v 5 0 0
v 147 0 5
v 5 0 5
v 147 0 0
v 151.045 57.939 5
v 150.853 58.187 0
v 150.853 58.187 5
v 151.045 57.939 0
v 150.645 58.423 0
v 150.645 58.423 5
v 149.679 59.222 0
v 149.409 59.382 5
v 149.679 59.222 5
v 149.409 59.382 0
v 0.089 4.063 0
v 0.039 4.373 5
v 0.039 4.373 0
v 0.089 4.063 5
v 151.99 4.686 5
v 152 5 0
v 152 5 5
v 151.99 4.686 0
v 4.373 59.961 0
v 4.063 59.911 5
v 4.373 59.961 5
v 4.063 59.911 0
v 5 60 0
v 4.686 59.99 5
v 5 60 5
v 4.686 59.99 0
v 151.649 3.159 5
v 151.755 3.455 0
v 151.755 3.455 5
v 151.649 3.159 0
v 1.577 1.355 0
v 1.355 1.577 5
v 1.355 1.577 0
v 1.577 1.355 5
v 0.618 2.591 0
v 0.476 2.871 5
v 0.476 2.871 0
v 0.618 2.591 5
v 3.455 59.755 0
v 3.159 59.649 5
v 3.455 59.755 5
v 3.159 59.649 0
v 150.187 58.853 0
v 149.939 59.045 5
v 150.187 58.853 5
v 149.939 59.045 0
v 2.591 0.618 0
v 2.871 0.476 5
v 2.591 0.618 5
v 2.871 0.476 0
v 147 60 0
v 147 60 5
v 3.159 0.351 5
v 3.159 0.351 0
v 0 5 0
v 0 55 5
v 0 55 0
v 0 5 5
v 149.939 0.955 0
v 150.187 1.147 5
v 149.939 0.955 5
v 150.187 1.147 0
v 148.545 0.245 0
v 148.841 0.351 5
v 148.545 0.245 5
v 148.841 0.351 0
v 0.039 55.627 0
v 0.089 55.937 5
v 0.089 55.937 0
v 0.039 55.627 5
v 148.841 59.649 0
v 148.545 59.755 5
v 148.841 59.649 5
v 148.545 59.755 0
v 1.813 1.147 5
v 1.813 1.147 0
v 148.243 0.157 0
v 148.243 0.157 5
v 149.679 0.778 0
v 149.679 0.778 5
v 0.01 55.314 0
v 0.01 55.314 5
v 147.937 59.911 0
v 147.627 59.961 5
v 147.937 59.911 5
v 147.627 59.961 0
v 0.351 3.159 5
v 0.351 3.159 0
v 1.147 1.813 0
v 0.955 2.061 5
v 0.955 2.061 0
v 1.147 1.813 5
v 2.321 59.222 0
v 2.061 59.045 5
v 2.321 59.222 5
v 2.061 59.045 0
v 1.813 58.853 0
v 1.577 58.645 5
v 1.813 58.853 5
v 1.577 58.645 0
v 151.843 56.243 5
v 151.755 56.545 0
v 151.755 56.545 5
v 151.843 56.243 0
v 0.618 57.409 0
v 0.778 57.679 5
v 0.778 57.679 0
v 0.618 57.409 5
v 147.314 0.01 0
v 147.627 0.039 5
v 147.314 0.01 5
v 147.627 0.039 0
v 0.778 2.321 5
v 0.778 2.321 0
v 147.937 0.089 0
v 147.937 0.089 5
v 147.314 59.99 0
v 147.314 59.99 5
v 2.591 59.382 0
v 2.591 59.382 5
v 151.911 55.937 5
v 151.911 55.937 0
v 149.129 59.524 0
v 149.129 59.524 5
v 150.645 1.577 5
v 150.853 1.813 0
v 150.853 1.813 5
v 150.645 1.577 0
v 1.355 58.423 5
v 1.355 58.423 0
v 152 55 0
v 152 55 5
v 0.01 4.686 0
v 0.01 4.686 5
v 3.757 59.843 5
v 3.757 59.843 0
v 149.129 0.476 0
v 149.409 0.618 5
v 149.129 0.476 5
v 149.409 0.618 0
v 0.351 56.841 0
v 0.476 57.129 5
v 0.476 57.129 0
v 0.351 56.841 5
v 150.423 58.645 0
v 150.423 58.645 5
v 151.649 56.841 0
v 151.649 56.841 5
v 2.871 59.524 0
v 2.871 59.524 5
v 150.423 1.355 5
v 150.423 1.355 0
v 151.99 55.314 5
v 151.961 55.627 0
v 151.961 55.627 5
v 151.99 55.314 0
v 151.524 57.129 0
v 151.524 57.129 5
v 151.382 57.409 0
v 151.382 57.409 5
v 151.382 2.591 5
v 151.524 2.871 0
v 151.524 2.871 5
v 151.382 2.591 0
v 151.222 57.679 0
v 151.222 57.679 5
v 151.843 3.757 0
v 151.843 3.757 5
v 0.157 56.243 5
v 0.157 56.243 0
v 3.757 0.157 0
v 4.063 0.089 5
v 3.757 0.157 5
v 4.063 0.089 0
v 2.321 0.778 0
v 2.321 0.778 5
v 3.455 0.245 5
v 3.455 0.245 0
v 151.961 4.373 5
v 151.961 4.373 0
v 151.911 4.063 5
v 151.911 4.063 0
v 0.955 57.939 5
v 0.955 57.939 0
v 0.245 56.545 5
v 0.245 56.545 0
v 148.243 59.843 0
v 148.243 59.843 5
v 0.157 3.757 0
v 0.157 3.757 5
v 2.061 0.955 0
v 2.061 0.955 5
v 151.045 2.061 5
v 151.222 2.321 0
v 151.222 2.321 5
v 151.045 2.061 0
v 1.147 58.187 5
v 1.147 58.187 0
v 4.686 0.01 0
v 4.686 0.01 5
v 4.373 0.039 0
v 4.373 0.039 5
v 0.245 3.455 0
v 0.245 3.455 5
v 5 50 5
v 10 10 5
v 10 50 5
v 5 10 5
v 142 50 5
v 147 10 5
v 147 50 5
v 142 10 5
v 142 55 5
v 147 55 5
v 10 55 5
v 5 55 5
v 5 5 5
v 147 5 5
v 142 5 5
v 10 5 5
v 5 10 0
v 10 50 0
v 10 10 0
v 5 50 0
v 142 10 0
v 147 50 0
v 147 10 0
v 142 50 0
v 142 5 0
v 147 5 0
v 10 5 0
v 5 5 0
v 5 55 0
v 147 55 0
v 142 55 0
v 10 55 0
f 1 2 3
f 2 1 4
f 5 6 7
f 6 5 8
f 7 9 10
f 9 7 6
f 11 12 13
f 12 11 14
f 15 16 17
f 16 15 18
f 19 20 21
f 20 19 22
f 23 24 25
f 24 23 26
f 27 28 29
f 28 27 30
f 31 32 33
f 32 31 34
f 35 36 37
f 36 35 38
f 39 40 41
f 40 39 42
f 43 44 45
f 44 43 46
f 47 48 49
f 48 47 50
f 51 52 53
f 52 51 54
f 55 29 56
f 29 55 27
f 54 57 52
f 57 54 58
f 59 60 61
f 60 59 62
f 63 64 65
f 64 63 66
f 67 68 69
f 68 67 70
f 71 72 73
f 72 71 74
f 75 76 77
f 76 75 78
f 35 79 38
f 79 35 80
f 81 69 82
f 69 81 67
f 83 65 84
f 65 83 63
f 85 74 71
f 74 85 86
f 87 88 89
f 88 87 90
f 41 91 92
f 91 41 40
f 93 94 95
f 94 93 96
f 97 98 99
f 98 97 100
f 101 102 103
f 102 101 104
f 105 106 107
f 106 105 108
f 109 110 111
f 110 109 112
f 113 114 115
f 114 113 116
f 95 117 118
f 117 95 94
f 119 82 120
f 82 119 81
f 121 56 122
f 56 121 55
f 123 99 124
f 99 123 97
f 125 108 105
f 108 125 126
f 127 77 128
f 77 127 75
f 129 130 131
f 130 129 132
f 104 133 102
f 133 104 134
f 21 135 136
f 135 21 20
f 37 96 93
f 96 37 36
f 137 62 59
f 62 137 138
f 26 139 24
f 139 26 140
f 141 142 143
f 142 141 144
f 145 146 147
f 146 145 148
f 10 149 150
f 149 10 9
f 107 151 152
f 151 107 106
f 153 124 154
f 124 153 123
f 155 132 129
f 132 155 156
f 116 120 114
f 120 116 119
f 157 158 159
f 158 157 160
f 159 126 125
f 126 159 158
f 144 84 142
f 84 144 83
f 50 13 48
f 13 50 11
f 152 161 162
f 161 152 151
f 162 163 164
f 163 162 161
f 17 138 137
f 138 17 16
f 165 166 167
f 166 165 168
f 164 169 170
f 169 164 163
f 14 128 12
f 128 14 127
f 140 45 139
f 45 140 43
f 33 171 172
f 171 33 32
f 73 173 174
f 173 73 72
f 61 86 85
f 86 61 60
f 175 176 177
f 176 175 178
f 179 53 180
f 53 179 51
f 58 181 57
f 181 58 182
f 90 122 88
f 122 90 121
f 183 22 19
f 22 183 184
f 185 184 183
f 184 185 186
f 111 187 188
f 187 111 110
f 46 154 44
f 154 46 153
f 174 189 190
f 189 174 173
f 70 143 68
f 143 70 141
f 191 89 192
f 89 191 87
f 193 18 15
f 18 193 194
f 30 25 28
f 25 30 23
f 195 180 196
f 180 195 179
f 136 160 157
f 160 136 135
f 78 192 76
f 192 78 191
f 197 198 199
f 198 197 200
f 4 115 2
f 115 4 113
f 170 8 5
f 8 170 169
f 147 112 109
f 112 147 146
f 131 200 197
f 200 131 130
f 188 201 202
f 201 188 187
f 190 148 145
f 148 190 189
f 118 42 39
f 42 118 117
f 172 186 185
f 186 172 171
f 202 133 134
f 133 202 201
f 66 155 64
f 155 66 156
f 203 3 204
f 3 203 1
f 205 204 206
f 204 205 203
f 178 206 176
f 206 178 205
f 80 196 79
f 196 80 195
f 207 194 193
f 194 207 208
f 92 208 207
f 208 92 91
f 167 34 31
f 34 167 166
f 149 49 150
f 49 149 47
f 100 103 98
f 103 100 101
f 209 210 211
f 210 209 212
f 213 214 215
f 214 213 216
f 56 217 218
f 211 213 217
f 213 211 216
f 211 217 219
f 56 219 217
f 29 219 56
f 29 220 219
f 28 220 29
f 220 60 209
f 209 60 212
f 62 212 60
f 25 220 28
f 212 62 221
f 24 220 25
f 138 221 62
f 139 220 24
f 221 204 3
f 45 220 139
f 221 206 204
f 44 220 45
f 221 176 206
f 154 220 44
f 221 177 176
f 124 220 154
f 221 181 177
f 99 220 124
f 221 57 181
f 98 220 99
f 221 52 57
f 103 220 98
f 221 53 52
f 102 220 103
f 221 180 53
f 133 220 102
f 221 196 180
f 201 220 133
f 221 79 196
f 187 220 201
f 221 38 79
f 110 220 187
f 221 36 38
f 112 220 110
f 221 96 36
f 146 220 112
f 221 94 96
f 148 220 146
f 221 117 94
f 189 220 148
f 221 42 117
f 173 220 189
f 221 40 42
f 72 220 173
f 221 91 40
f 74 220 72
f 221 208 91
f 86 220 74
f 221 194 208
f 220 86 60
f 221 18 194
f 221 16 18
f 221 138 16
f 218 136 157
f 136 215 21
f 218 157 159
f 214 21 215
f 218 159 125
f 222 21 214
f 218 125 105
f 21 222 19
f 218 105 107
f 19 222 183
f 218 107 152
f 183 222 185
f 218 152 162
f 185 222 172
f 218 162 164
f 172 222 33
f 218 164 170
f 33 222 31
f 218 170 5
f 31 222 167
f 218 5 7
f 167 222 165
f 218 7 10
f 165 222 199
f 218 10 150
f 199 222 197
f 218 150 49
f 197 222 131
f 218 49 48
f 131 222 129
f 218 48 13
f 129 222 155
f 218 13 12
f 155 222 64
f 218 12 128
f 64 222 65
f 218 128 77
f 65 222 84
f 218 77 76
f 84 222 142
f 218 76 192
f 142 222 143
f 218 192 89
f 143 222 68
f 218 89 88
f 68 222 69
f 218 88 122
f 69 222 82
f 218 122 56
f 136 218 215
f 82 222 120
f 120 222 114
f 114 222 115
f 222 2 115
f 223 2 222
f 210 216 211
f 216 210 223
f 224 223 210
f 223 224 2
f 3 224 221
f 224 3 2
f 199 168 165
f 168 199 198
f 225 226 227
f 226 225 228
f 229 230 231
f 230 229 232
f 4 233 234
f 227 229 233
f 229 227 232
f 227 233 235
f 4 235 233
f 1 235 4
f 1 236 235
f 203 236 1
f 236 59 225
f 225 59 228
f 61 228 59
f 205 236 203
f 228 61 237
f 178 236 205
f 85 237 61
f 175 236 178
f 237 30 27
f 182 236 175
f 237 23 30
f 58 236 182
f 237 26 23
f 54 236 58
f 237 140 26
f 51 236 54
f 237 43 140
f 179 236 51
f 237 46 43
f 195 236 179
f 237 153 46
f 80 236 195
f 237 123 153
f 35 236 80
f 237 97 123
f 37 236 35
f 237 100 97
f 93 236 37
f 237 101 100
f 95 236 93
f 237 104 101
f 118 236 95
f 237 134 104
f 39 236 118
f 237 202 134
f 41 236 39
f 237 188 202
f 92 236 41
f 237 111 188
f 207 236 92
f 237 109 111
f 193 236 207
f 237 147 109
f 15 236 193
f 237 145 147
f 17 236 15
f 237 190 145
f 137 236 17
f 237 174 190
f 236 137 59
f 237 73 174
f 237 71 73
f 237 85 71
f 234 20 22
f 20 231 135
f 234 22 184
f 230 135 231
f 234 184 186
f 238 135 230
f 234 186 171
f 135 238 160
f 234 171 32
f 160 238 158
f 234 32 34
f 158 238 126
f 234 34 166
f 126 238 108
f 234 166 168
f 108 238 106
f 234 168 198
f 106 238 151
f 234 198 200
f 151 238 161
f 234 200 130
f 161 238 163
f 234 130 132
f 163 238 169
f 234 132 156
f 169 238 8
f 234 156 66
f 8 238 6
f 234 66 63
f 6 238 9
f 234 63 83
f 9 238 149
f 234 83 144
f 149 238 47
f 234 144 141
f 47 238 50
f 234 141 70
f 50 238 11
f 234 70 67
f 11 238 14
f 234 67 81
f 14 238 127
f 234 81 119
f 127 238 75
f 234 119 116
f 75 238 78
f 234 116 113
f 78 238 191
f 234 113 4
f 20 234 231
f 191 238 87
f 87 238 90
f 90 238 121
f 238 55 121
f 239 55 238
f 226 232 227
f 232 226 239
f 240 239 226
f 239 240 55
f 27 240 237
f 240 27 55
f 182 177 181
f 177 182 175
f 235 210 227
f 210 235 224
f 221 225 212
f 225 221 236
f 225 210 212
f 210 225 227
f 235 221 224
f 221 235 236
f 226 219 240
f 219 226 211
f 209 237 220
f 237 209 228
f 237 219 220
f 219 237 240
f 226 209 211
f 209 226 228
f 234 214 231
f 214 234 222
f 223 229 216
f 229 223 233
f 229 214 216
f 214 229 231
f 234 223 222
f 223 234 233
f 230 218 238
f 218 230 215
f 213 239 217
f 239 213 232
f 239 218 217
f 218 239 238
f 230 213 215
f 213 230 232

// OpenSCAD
/*
 * Simple Modular Frame v1.0
 *
 * http://www.thingiverse.com/thing:1902773
 *
 * By: Maxstupo
 */


/* [Frame Settings] */
// (Select what part to generate):
framePart = 1; // [0:3]

// (The width of the plate):
width = 152;

// (The length of the plate):
length = 60;

// (The height of the plate, also used for the stilt generation):
height = 5;

// (The stilt size, and the stilt slot size):
slotSize = 5;

// (The spacing between the edges of the plate and the stilt slots):
spacing = 5;

// (The plate fillet):
fillet = 10;



/* [Frame 2 Settings] */
// (The width between the mount holes from center-to-center):
mountWidth = 20;

// (The length between the mount holes from center-to-center):
mountLength = 40;

// (The diameter of the mount holes):
mountHoleSize = 3;

// (The spacing from the edge of the plate):
mountSpacingFromEdge = 10;


/* [Frame 3 Settings] */
// (The height of the stilt):
stiltHeight = 50;


/* [Misc] */
// (The tolerance to apply to both plates or stilts):
tolerance = 0;

// (The tolerance for the test part #0):
toleranceTest = 0;

$fn=100;

if(framePart == 0) {
    toleranceTest(rodSize=5,rodLength=30,thickness=5,tolerance=toleranceTest);  
    
} else if (framePart == 1) {
    plate(width, length, height, slotSize + tolerance / 2, spacing, fillet);

} else if (framePart == 2) {
    plateWithMotorMountHoles(width, length, height, slotSize + tolerance / 2, spacing, fillet, mountWidth, mountLength, mountHoleSize, mountSpacingFromEdge);

} else if (framePart == 3) {
    stilt(stiltHeight, slotSize - tolerance / 2, height);

}


module toleranceTest(rodSize=5, rodLength=30, thickness=5,tolerance=0){
    // The hole.
    difference(){
        rs=rodSize+(tolerance/2);
        cube([thickness * 2 + rs, thickness * 2 + rs, rodLength / 3]);
        translate([(thickness * 2 + rs) / 2 - rs / 2, (thickness * 2 + rs) / 2 - rs / 2, -1]) cube([rs, rs, rodLength / 3 + 2]);
    }
    
    // The rod.
    translate([thickness * 2 + rodSize + 10, 0, 0]) cube([rodSize - (tolerance / 2), rodLength, rodSize - (tolerance / 2)]);
}

module plate(width=152, length=60, height=5, slotSize=5, spacing=5, fillet=10) {
    r = min(length, fillet);
    
    difference(){
       
        // The plate. 
        if(r > 0){
            hull(){
                translate([(r / 2), (r / 2), 0]) cylinder(h=height, d=r);
                translate([width - (r / 2), (r / 2), 0]) cylinder(h=height, d=r);
                translate([width - (r / 2), length - (r / 2), 0]) cylinder(h=height, d=r);
                translate([(r / 2), length - (r / 2), 0]) cylinder(h=height, d=r);
            }
        }else{
            cube([width, length, height]);
        }
        
        // Stilt holes.
        translate([spacing, spacing, -1]) cube([slotSize, slotSize, height + 2]);
        translate([spacing, length - slotSize - spacing, -1]) cube([slotSize, slotSize, height + 2]);
        translate([width - slotSize - spacing,  spacing, -1]) cube([slotSize, slotSize, height + 2]);
        translate([width - slotSize - spacing, length - slotSize - spacing, -1]) cube([slotSize, slotSize, height + 2]);
    }
}

module plateWithMotorMountHoles(width=152, length=60, height=5, slotSize=5, spacing=5, fillet=10, mountWidth=20,mountLength=40,mountHoleSize=3,mountSpacingFromEdge=5){
    difference(){
        plate(width, length, height, slotSize, spacing, fillet);
        
        translate([mountSpacingFromEdge + mountHoleSize / 2, length / 2 - mountWidth / 2, -1]){
           translate([0, 0, 0]) cylinder(d=mountHoleSize, h=height + 2);
           translate([mountLength, 0, 0]) cylinder(d=mountHoleSize, h=height + 2);
           translate([0, mountWidth, 0]) cylinder(d=mountHoleSize, h=height + 2);
           translate([mountLength, mountWidth, 0]) cylinder(d=mountHoleSize, h=height + 2);
        }
        
        translate([width - mountLength - mountHoleSize / 2 - mountSpacingFromEdge, length / 2 - mountWidth / 2, -1]){
           translate([0, 0, 0]) cylinder(d=mountHoleSize, h=height + 2);
           translate([mountLength, 0, 0]) cylinder(d=mountHoleSize, h=height + 2);
           translate([0, mountWidth, 0]) cylinder(d=mountHoleSize,h=height + 2);
           translate([mountLength, mountWidth, 0]) cylinder(d=mountHoleSize, h=height + 2);
        }
    }
}

module stilt(height=50, size=10, plateHeight=5) {
    union(){
        cube([height+plateHeight, size, size]);
        translate([plateHeight / 2, size, 0]) rightAngleTriangle(a=size, b=size, height=size);
        translate([height+plateHeight/2, size, size]) rotate([0, 180, 0]) rightAngleTriangle(a=size, b=size, height=size);
    }
}


module rightAngleTriangle(a, b, height=1) {
	aCos = cos(90) * a;
	aSin = sin(90) * a;
	polyhedron(
		points=[[0, 0, 0], [b, 0, 0], [aCos, aSin, 0], [0, 0, height], [b, 0, height], [aCos, aSin, height]],
        faces=[[0, 1, 2], [2, 1, 4, 5], [0, 2, 5, 3], [3, 4, 1, 0], [4, 3, 5]]
    );
}
